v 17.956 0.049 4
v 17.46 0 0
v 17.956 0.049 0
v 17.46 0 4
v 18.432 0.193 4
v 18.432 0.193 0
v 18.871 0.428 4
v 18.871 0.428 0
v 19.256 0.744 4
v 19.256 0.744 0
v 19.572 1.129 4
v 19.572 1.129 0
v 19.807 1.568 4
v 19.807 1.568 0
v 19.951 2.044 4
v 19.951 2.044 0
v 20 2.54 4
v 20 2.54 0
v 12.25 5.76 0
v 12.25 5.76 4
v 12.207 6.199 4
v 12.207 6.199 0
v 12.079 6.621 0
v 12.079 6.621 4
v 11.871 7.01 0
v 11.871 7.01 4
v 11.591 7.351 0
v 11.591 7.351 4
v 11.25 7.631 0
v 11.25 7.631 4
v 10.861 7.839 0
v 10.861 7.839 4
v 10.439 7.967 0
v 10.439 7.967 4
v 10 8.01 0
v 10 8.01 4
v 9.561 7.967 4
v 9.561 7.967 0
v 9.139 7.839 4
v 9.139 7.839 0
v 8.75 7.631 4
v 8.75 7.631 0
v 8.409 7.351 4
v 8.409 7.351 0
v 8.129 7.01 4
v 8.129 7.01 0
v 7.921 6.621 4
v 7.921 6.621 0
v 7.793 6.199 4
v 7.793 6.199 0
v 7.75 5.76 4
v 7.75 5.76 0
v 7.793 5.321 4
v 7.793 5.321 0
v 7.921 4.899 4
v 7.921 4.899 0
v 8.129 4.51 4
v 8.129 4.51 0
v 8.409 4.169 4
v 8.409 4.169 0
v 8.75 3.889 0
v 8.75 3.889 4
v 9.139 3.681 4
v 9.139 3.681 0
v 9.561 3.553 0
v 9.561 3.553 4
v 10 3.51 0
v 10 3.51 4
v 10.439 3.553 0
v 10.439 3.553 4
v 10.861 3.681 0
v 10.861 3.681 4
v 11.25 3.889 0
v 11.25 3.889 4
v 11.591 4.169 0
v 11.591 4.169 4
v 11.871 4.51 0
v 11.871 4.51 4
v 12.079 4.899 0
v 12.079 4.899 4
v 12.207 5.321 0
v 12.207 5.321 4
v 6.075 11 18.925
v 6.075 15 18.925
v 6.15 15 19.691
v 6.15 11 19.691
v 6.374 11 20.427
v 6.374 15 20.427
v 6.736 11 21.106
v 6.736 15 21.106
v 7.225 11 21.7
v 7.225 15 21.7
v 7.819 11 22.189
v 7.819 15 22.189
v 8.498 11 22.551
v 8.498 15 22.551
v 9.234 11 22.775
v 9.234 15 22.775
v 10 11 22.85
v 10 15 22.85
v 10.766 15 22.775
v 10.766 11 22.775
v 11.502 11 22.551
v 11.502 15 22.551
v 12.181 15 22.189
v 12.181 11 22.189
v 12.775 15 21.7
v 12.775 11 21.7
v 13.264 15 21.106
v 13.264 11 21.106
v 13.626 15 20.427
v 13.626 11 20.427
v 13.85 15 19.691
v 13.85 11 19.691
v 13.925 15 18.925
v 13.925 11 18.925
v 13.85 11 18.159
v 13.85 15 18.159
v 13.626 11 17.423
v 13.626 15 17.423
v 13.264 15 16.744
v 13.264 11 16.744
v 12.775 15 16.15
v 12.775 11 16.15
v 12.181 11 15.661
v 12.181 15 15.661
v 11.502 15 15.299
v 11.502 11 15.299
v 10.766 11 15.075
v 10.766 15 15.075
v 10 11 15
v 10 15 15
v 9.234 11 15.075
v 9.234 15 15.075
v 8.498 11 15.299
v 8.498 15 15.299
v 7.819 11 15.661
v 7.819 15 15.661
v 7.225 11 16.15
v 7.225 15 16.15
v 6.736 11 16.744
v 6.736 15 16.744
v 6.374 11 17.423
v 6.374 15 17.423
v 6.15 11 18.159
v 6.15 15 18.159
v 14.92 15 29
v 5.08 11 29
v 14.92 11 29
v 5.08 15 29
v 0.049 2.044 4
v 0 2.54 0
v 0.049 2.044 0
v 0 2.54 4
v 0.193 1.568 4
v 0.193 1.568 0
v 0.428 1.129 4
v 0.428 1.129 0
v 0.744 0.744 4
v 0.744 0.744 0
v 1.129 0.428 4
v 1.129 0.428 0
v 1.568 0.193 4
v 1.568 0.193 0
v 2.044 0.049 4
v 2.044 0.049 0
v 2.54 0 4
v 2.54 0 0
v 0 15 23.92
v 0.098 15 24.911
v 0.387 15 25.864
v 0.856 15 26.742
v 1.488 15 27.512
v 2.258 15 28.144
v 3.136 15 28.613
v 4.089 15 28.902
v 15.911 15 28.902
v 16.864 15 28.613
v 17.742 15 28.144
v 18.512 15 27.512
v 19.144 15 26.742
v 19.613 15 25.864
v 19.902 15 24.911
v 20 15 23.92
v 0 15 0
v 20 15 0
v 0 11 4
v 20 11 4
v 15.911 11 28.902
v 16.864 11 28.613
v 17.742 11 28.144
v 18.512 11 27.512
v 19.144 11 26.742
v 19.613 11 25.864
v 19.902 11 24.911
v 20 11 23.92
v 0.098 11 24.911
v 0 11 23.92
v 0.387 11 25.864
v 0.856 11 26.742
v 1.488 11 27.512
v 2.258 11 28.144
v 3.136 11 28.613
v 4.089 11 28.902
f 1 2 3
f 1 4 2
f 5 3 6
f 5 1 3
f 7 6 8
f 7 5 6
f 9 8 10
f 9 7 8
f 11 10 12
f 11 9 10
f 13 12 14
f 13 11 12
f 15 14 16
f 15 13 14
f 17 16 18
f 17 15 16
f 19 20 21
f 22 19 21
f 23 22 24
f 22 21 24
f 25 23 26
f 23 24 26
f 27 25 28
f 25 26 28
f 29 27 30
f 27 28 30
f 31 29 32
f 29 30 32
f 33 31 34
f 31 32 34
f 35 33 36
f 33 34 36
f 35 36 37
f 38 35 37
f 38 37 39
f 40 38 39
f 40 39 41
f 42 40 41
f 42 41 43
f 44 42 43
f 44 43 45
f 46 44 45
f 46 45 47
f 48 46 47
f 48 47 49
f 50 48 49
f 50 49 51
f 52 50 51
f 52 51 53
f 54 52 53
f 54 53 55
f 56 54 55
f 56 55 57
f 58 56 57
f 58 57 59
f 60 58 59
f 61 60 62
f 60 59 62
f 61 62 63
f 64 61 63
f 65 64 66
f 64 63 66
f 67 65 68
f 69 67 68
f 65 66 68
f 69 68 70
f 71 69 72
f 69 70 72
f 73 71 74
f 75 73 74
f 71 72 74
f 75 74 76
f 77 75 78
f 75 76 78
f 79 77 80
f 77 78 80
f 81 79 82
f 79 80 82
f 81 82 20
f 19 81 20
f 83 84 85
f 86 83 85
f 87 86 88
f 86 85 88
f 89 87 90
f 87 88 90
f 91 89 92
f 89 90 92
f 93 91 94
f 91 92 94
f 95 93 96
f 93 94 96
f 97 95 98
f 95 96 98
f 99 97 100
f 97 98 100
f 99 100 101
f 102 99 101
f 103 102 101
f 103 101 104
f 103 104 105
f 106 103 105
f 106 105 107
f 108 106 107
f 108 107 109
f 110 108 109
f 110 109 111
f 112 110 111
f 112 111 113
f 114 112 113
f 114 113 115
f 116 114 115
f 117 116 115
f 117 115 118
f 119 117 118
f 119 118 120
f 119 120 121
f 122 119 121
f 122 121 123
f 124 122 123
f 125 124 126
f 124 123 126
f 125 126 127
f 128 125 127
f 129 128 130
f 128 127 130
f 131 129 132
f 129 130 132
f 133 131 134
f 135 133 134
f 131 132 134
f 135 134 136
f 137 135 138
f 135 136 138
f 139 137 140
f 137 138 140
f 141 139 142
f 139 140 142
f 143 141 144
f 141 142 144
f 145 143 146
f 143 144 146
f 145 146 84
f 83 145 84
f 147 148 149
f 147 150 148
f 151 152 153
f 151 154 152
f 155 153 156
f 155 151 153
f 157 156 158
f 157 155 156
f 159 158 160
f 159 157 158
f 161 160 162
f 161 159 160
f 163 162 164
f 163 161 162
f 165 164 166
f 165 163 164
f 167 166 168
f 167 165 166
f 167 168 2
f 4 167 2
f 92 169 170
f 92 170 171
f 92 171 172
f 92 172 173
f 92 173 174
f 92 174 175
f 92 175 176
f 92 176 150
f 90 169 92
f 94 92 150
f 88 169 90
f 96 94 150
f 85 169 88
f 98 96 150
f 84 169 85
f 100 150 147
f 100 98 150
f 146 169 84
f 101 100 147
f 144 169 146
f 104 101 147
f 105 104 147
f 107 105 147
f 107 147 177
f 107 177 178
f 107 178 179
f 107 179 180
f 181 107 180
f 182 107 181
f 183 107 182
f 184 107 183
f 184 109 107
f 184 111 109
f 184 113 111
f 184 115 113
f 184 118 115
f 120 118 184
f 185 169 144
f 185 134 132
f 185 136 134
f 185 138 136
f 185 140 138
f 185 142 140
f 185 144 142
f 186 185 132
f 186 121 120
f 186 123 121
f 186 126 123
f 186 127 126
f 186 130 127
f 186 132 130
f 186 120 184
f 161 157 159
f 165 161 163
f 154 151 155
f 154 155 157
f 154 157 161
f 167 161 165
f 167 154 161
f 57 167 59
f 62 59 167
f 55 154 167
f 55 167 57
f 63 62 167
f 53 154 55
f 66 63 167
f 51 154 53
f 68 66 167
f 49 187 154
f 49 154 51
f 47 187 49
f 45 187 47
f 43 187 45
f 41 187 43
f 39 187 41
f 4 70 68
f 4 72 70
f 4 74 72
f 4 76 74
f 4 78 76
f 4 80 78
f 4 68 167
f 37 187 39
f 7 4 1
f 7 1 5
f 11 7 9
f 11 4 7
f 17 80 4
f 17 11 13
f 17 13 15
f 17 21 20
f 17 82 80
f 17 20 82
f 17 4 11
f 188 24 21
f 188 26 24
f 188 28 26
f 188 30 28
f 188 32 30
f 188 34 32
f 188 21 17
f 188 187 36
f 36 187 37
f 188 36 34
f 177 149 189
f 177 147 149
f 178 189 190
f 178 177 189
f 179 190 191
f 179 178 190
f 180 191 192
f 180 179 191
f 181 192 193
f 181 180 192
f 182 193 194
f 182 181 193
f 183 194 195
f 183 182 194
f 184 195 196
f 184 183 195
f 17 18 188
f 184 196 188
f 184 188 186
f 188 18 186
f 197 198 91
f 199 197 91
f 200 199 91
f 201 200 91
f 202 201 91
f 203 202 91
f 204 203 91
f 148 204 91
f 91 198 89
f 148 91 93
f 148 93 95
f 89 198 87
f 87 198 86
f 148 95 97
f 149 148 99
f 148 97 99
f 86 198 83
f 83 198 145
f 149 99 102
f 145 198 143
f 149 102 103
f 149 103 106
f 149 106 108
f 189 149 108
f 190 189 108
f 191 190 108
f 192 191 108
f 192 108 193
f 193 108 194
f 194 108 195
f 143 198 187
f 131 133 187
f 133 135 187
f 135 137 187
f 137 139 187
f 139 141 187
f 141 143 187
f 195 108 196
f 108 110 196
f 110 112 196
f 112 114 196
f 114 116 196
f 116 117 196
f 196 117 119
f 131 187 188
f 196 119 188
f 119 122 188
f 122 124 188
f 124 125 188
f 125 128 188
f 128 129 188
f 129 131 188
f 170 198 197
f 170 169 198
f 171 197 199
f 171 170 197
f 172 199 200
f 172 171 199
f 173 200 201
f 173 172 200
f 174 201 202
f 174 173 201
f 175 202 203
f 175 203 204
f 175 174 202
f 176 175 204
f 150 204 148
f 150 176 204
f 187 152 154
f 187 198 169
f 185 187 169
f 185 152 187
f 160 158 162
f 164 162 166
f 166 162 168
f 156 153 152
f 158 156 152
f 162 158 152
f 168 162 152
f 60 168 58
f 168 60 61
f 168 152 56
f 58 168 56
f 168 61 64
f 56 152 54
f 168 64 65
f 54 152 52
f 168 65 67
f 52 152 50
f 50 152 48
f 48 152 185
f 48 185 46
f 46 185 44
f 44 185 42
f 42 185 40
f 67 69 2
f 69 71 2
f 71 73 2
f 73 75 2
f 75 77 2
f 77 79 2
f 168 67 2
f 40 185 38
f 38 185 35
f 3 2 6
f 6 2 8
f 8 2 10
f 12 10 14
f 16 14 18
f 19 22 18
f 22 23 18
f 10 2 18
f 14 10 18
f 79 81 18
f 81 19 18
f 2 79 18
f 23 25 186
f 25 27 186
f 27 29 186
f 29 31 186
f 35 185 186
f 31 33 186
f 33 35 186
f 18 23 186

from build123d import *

# Parameters (mm, degrees)
F0_W     = 20
F0_H     = 15
F1_DEPTH = 4
F2_W     = 20
F2_H     = 4
F3_DEPTH = 25
F4_R     = 2.25
F5_DEPTH = 25.4
F6_R     = 3.925
F7_DEPTH = 25.4
F8_R     = 2.54
F9_R     = 5.08


with BuildPart() as f1:
    # F0 (on Top) → F1 (new body)
    with BuildSketch(Plane.XY):
        with Locations((10, 7.5)):
            Rectangle(F0_W, F0_H)
    extrude(amount=F1_DEPTH)

    # F2 (on face) → F3 (join)
    with BuildSketch(Plane.XY.offset(4)):
        with Locations((10, 13)):
            Rectangle(F2_W, F2_H)
    extrude(amount=F3_DEPTH)

    # F4 (on face) → F5 (cut)
    with BuildSketch(Plane.XY.offset(4)):
        with Locations((10, 5.760205)):
            Circle(F4_R)
    extrude(amount=-F5_DEPTH, mode=Mode.SUBTRACT)

    # F6 (on face) → F7 (cut)
    with BuildSketch(Plane(origin=(0, 15, 0), x_dir=(-1, 0, 0), z_dir=(0, 1, 0))):
        with Locations((-10, 18.925)):
            Circle(F6_R)
    extrude(amount=-F7_DEPTH, mode=Mode.SUBTRACT)

    # F8
    f8_edges = [f1.edges().sort_by_distance(p)[0] for p in [
        (20, 0, 2),
        (0, 0, 2),
    ]]
    fillet(f8_edges, radius=F8_R)

    # F9
    f9_edges = [f1.edges().sort_by_distance(p)[0] for p in [
        (20, 13, 29),
        (0, 13, 29),
    ]]
    fillet(f9_edges, radius=F9_R)


solid = f1.part
